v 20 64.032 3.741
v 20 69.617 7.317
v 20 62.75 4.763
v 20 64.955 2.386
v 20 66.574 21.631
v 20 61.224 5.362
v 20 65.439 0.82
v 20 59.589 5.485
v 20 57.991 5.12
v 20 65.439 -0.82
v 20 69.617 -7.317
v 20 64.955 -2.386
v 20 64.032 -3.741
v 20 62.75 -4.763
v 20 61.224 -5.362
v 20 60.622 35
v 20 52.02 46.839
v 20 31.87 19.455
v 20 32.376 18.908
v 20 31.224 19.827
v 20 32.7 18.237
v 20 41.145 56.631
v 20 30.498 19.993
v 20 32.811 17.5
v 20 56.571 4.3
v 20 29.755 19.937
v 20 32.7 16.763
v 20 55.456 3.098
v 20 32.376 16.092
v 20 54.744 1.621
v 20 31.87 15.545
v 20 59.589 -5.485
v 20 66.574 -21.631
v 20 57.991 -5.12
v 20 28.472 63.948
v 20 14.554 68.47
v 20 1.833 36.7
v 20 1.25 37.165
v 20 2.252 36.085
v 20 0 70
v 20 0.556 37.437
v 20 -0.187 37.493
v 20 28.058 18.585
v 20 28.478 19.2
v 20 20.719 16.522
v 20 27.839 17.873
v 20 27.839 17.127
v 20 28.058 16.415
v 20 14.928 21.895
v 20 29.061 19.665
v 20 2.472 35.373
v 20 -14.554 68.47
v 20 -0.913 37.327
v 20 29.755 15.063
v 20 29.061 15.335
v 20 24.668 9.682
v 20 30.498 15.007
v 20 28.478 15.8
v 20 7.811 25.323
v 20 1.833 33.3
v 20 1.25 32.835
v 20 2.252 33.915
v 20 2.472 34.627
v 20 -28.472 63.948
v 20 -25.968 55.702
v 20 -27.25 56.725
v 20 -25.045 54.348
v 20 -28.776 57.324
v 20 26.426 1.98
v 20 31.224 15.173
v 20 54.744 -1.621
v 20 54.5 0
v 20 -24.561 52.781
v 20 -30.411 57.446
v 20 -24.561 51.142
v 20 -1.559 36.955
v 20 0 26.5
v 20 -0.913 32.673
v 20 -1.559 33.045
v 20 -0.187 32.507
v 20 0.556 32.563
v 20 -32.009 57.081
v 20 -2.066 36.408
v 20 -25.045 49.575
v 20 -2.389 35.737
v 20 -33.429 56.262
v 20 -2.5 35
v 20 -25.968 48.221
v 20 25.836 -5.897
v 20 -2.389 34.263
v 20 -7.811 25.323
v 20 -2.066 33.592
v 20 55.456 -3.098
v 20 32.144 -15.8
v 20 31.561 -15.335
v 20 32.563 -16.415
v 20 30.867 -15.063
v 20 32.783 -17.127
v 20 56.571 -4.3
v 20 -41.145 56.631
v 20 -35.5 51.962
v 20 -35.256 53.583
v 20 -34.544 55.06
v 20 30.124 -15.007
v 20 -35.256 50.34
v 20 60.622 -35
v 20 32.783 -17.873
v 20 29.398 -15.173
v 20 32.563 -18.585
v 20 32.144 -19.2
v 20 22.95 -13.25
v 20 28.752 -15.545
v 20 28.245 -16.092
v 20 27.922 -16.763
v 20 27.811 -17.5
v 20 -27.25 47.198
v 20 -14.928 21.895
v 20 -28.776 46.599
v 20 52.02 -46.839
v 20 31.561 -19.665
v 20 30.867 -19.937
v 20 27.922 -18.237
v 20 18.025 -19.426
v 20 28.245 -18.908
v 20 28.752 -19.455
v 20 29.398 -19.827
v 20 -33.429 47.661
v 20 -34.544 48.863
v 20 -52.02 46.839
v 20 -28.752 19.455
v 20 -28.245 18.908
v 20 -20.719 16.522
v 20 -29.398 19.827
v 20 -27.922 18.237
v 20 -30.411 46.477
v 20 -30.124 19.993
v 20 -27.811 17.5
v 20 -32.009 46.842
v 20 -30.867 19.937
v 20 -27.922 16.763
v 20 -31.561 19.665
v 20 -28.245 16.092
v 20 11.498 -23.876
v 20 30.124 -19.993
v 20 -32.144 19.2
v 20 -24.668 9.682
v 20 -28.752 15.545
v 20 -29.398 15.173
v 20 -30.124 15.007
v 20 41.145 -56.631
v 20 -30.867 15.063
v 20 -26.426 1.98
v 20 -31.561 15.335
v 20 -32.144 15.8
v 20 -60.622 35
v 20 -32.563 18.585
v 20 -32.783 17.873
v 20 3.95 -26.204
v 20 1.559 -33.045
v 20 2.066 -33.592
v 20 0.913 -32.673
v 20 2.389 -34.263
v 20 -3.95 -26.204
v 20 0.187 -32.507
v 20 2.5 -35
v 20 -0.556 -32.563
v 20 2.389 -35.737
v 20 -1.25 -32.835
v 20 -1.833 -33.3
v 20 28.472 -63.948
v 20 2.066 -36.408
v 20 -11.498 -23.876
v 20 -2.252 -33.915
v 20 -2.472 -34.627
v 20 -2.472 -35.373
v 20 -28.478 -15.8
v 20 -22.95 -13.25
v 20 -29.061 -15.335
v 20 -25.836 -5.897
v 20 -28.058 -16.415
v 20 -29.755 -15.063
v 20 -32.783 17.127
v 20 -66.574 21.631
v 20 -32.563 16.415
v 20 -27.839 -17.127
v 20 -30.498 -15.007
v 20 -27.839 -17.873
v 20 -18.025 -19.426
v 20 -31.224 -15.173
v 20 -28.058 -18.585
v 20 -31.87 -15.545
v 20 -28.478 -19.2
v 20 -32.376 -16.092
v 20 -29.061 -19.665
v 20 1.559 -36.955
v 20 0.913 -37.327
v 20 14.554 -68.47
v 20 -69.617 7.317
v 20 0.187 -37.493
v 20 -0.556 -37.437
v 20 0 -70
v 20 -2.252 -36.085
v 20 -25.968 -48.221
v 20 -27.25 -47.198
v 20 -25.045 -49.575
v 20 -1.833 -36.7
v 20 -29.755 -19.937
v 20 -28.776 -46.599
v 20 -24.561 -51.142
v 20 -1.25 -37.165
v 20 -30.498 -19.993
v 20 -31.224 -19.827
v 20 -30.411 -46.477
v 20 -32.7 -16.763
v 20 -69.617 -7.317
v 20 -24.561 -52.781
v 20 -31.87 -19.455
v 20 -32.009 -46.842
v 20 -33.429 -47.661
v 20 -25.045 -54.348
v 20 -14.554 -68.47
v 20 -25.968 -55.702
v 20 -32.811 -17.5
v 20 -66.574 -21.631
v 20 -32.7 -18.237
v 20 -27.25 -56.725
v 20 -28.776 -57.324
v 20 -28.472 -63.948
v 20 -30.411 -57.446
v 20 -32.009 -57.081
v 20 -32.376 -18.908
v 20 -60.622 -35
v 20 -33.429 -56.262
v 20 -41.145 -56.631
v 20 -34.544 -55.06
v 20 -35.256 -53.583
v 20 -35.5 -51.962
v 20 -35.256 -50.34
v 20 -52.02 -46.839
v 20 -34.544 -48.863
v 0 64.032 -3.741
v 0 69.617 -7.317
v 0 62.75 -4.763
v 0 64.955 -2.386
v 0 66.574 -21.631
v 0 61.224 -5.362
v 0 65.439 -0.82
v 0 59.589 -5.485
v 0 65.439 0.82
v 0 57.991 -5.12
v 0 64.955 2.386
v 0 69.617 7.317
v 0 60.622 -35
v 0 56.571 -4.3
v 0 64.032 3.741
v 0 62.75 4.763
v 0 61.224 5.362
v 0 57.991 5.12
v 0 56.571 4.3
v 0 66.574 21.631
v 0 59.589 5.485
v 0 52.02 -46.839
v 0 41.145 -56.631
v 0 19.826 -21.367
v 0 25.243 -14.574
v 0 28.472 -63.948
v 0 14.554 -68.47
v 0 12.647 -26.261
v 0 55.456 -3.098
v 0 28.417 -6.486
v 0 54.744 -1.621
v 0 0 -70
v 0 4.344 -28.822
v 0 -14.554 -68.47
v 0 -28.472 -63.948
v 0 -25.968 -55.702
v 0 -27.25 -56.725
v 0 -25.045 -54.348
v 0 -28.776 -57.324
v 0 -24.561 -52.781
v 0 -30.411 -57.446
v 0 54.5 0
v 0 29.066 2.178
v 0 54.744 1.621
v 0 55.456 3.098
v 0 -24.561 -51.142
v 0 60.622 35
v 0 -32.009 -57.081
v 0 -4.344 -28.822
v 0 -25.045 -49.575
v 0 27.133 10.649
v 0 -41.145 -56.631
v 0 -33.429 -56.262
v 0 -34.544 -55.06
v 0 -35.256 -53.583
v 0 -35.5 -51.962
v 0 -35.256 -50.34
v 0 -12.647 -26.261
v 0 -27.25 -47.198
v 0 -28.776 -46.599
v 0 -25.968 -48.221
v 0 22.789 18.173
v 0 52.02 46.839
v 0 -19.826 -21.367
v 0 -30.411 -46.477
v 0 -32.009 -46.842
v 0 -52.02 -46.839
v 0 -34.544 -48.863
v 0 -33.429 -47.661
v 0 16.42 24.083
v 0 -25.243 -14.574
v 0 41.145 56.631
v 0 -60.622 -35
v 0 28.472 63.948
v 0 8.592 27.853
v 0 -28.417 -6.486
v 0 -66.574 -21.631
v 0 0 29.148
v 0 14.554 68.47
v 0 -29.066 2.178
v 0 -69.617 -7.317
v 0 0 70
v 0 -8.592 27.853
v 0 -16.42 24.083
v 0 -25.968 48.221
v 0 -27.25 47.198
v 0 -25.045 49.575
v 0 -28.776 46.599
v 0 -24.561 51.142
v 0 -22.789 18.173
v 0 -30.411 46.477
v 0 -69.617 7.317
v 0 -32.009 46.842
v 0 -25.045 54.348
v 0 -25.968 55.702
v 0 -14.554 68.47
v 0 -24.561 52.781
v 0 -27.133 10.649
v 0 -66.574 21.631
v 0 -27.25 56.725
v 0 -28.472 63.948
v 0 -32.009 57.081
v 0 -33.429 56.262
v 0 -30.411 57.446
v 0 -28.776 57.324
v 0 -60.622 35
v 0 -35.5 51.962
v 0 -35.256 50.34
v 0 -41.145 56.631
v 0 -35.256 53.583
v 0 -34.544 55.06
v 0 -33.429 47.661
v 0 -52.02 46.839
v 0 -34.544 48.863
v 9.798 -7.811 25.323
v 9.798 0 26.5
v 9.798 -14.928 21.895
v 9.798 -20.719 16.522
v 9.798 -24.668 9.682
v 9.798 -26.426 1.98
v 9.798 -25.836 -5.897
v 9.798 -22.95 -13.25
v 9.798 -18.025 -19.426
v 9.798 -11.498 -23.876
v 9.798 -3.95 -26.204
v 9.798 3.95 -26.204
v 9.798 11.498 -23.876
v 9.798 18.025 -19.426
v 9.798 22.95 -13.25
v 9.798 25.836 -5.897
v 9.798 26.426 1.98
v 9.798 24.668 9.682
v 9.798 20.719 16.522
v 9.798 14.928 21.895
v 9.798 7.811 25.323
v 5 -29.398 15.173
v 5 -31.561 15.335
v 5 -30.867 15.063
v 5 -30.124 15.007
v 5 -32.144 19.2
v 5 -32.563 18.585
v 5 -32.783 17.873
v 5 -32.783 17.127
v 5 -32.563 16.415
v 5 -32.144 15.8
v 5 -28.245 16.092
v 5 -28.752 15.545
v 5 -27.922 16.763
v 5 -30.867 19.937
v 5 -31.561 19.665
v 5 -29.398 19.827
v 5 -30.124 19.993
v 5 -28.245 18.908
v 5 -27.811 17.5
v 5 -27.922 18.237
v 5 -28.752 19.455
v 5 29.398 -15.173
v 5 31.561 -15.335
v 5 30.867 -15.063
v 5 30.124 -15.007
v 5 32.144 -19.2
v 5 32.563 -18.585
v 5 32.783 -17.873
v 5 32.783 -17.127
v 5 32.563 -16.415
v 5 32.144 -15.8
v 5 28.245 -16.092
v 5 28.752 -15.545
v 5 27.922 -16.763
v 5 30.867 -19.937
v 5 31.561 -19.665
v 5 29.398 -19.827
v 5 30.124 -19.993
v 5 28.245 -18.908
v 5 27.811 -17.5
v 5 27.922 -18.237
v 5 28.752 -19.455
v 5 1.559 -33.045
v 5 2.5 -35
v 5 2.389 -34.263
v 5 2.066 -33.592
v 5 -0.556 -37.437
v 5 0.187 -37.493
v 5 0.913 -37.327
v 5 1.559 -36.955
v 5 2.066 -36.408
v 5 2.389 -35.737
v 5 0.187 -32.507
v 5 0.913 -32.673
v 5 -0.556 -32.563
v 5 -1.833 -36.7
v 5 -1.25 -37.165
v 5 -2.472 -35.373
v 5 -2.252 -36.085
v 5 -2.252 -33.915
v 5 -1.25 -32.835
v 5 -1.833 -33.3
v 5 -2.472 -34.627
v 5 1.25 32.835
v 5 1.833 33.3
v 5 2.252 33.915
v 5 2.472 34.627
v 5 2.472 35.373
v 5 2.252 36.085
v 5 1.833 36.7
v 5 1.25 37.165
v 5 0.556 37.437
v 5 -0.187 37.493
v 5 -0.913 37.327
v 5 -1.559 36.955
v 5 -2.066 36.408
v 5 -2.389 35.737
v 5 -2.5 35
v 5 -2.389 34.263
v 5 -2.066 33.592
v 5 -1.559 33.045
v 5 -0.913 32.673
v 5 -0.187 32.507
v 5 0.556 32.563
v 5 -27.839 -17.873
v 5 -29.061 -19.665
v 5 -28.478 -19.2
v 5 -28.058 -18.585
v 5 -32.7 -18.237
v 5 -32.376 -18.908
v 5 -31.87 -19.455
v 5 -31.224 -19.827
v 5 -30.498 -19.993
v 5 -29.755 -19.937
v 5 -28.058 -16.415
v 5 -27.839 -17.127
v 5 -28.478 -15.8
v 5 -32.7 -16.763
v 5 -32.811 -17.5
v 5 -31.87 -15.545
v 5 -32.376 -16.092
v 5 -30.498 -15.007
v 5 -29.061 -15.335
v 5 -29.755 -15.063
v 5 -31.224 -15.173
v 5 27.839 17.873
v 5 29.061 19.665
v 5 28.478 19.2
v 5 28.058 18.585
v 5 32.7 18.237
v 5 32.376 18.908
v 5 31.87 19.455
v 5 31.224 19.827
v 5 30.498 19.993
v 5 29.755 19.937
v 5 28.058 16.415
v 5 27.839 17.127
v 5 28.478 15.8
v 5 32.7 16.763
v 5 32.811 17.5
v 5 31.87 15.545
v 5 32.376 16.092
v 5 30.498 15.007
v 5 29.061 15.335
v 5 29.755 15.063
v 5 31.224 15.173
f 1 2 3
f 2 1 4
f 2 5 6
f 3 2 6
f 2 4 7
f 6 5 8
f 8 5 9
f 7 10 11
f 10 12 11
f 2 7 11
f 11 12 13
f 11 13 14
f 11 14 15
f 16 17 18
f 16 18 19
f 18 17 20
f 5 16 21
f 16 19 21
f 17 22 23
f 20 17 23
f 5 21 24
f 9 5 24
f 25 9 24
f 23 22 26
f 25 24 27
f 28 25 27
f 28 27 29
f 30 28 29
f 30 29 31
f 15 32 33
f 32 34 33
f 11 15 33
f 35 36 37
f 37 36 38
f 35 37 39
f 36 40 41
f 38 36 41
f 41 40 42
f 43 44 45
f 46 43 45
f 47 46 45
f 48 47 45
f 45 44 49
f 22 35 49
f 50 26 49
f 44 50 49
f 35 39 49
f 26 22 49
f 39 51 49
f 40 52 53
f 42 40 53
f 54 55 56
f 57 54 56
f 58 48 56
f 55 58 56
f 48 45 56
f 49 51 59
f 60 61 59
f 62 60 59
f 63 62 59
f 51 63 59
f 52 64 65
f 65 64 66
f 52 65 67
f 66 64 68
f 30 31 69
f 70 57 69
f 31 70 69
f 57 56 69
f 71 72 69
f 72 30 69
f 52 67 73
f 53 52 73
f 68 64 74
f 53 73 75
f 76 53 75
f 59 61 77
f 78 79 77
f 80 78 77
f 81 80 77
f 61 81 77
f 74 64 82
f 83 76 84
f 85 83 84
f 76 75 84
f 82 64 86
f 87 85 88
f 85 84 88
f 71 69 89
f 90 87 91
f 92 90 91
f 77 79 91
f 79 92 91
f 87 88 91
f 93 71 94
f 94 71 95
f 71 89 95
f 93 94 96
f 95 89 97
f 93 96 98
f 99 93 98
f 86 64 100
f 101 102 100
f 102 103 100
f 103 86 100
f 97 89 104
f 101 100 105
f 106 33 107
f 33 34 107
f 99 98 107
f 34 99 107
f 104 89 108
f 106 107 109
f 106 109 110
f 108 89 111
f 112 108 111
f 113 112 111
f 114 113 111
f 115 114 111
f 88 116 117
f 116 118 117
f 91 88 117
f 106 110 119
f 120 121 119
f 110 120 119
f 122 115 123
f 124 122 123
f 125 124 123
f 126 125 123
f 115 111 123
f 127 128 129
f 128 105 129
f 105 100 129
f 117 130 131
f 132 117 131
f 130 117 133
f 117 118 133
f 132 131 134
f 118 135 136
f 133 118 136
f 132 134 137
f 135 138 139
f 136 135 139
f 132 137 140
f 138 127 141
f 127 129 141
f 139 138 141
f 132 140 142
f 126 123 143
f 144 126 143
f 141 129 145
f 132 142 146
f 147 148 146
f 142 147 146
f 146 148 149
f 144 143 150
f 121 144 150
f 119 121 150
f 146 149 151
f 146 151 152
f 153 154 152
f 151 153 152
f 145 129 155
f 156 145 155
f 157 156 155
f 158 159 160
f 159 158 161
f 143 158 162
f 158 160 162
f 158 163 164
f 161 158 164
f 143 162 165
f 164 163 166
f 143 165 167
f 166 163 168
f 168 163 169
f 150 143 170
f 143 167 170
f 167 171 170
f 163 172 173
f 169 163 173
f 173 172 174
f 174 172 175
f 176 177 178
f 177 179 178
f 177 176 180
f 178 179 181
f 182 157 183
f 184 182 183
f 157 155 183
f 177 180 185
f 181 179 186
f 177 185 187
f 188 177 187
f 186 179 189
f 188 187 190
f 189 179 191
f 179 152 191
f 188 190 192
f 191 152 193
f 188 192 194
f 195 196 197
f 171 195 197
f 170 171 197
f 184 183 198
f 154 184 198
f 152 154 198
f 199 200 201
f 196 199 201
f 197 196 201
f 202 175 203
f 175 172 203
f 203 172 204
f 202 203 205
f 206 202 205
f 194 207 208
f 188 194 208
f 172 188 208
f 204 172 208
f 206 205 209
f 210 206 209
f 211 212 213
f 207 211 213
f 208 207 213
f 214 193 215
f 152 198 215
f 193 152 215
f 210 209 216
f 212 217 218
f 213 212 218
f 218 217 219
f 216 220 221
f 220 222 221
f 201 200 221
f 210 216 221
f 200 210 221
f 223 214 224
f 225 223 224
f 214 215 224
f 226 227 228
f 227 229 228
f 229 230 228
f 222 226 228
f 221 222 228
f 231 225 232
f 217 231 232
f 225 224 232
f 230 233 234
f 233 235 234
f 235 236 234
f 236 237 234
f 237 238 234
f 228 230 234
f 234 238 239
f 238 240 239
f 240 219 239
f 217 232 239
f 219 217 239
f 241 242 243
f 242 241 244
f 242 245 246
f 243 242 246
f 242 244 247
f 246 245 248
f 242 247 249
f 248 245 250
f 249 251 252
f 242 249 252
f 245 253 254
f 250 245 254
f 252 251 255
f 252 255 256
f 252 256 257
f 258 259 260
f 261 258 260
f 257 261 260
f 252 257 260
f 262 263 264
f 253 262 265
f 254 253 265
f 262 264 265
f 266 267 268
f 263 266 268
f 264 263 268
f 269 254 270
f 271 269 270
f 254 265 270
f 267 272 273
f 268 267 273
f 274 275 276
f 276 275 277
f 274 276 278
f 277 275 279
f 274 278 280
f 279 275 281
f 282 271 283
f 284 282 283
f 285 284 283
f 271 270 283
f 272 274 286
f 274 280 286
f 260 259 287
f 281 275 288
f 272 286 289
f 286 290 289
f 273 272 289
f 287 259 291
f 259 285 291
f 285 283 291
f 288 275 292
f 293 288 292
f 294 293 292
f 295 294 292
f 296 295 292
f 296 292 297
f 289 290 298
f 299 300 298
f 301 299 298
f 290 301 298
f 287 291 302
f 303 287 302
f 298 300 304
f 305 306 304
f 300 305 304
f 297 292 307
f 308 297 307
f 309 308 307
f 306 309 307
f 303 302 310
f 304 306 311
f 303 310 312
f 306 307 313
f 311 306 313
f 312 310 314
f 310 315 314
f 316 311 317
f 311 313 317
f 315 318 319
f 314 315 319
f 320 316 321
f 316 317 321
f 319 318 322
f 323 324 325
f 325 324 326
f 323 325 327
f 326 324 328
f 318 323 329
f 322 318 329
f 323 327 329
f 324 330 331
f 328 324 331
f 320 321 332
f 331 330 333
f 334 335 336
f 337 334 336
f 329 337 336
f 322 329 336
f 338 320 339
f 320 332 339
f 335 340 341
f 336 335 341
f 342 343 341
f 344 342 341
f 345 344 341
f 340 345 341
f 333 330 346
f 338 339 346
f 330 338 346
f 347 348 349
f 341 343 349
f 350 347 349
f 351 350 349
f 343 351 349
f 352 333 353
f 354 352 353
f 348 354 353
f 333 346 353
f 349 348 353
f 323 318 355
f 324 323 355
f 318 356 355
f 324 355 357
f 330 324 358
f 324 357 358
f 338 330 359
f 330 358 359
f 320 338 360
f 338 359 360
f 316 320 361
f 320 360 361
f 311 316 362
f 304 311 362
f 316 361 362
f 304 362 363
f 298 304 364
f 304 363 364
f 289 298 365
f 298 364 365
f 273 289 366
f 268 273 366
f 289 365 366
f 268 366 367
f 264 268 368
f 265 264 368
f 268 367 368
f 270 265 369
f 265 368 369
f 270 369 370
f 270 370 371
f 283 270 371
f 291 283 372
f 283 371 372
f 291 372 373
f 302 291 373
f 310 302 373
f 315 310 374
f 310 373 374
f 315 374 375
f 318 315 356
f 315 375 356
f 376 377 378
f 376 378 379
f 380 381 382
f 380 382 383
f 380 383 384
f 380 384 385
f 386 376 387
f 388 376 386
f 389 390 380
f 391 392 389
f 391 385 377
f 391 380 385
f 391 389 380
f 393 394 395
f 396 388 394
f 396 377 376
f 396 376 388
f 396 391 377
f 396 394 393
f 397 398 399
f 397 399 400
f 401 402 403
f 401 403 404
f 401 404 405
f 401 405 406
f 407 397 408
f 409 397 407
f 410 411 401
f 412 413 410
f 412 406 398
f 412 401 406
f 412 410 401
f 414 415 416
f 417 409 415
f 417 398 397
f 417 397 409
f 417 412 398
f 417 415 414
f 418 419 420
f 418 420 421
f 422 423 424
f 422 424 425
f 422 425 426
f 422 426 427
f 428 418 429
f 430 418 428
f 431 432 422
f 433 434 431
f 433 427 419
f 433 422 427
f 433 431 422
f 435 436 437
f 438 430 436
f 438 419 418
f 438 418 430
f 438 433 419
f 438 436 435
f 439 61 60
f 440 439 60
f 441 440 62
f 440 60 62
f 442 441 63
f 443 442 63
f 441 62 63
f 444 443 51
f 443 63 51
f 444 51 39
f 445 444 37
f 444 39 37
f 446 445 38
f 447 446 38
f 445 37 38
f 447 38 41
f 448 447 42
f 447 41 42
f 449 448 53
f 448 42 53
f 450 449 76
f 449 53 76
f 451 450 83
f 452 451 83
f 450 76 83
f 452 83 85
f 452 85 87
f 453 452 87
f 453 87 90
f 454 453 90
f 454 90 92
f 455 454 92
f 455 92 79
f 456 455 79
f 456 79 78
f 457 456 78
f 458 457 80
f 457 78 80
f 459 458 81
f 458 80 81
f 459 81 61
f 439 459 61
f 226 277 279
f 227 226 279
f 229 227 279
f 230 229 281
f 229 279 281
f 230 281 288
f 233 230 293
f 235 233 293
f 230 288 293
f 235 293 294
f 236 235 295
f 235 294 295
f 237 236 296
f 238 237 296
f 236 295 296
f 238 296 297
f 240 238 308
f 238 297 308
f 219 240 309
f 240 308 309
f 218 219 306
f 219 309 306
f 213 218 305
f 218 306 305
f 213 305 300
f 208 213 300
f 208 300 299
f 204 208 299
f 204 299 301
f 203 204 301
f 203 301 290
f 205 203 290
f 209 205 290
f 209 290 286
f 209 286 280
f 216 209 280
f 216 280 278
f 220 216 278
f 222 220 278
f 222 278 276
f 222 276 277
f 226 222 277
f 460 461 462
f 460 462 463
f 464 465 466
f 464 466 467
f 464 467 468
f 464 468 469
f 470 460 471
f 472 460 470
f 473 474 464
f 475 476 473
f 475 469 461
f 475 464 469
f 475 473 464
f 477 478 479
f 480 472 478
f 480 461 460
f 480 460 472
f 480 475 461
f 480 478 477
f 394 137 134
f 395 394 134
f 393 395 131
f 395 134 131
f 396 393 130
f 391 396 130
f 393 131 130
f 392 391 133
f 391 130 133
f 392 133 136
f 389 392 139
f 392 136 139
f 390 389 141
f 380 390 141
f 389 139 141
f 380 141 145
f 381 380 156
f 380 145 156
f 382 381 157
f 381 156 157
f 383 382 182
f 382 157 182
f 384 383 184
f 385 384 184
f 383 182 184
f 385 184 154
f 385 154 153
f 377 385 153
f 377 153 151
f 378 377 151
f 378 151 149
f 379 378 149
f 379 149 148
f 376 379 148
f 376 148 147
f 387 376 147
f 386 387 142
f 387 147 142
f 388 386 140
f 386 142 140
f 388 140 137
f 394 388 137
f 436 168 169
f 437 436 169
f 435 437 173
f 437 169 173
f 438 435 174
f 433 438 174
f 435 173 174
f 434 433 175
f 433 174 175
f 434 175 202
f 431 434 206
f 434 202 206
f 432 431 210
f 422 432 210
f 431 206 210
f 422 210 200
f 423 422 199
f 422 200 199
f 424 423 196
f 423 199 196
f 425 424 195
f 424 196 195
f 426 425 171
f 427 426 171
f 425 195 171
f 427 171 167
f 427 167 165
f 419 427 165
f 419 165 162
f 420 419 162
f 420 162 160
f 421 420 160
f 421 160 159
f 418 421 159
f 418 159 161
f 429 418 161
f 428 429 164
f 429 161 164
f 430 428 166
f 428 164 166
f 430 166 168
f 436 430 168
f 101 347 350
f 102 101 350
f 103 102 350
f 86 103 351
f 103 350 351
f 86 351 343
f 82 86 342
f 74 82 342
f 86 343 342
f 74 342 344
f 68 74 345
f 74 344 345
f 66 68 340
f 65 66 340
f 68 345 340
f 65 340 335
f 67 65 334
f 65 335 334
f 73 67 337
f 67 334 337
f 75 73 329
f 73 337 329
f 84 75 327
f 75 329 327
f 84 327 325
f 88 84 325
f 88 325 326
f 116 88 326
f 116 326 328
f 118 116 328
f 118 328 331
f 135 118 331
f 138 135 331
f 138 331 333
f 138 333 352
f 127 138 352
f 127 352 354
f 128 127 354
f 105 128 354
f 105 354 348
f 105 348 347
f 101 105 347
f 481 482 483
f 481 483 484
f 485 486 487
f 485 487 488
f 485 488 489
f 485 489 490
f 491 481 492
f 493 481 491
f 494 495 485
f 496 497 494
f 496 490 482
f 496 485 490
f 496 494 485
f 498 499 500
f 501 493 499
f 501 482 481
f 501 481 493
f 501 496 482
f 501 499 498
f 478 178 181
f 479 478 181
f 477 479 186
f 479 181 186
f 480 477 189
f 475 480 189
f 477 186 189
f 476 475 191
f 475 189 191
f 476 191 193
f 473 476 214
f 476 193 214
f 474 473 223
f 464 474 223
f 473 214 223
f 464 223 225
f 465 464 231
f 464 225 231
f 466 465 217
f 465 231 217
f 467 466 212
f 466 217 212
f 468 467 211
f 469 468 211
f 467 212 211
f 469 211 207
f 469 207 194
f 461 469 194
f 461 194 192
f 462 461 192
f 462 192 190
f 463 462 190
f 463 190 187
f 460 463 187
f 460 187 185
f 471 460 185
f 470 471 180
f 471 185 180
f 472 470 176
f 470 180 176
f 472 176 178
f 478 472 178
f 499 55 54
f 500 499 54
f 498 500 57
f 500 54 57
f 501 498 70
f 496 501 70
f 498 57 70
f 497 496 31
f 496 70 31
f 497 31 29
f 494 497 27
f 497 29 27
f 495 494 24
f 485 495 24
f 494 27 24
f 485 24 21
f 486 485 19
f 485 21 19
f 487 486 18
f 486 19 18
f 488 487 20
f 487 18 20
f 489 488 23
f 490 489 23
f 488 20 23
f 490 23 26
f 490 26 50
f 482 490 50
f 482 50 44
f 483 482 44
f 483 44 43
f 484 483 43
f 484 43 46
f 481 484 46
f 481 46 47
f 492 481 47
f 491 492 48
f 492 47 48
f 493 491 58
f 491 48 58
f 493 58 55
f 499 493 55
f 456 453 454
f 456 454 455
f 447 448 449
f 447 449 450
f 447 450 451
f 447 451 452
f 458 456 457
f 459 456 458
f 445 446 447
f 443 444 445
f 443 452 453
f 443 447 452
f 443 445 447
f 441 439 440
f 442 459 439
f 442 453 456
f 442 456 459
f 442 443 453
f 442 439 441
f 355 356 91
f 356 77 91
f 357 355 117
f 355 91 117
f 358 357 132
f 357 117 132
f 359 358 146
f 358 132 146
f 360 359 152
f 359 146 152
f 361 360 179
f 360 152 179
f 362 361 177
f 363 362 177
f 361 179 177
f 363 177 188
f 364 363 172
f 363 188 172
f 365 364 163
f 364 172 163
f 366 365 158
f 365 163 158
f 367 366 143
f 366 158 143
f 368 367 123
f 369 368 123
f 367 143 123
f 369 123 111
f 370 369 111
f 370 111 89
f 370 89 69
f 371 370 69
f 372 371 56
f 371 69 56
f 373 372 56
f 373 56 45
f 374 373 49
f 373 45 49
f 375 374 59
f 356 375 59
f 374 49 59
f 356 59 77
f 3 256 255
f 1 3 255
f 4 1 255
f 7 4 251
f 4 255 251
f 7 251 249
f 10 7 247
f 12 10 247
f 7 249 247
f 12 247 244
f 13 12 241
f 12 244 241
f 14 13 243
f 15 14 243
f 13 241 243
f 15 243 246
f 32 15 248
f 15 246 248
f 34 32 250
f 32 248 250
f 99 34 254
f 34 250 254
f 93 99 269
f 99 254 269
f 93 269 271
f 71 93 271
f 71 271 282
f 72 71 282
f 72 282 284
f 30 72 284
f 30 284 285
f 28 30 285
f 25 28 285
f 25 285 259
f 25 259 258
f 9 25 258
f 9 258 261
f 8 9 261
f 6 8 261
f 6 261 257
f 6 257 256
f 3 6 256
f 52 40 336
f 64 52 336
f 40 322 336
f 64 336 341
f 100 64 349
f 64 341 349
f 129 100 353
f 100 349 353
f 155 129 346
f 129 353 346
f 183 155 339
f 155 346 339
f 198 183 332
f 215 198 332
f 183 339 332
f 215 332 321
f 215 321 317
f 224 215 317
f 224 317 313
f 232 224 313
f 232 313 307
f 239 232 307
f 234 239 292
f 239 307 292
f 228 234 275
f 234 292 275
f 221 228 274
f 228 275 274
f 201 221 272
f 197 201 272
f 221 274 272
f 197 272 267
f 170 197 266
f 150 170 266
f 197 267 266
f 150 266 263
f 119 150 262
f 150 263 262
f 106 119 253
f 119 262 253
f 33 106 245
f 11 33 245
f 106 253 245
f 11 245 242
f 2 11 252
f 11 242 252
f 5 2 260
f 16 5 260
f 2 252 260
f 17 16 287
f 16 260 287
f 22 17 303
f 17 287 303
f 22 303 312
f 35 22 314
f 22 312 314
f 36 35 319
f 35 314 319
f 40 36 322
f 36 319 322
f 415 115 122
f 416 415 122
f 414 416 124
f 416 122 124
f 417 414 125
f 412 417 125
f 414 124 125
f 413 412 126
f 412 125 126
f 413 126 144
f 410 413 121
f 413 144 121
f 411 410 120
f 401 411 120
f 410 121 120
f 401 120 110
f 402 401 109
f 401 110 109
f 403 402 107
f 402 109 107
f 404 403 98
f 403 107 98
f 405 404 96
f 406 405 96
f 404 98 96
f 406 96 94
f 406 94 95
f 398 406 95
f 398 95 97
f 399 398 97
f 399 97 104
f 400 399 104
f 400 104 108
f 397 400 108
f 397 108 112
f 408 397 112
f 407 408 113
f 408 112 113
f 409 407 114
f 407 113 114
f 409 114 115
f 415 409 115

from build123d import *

# Parameters (mm, degrees)
F2_R            = 5.5
F3_DEPTH        = 20.001
F3_COPIES_COUNT = 3
F4_R            = 2.5
F5_DEPTH        = 15
F5_COPIES_COUNT = 6


# Not quite as in the source:
# - a pattern or mirror of a feature is missing from the dataset's text; its kind, count and spacing are read off the source's solid


with BuildPart() as f1:
    # F0 (on Front) → F1 (revolve)
    with BuildSketch(Plane.XZ):
        Polygon((0, 70), (0, 29.148), (9.798351825, 26.5), (20, 26.5), (20, 70), align=None)
    revolve(axis=Axis((21.5308236951, 0, 0), (1, 0, 0)))

    # F2 (on face) → F3 (cut, through all)
    with BuildSketch(Plane(origin=(0, 0, 0), x_dir=(0, -1, 0), z_dir=(-1, 0, 0))):
        with Locations((30, 51.9615242271)):
            Circle(F2_R)
    f3 = extrude(amount=-F3_DEPTH, mode=Mode.SUBTRACT)

    # F3_copies: F3 ×3 about axis
    f3_copies_axis = Axis((0, 0, 0), (1, 0, 0))
    for i in range(1, F3_COPIES_COUNT):
        add(f3.rotate(f3_copies_axis, i * 360 / F3_COPIES_COUNT), mode=Mode.SUBTRACT)

    # F4 (on face) → F5 (cut)
    with BuildSketch(Plane.YZ.offset(20)):
        with Locations((-30.3108891325, 17.5)):
            Circle(F4_R)
    f5 = extrude(amount=-F5_DEPTH, mode=Mode.SUBTRACT)

    # F5_copies: F5 ×6 about axis
    f5_copies_axis = Axis((0, 0, 0), (1, 0, 0))
    for i in range(1, F5_COPIES_COUNT):
        add(f5.rotate(f5_copies_axis, i * 360 / F5_COPIES_COUNT), mode=Mode.SUBTRACT)


solid = f1.part
